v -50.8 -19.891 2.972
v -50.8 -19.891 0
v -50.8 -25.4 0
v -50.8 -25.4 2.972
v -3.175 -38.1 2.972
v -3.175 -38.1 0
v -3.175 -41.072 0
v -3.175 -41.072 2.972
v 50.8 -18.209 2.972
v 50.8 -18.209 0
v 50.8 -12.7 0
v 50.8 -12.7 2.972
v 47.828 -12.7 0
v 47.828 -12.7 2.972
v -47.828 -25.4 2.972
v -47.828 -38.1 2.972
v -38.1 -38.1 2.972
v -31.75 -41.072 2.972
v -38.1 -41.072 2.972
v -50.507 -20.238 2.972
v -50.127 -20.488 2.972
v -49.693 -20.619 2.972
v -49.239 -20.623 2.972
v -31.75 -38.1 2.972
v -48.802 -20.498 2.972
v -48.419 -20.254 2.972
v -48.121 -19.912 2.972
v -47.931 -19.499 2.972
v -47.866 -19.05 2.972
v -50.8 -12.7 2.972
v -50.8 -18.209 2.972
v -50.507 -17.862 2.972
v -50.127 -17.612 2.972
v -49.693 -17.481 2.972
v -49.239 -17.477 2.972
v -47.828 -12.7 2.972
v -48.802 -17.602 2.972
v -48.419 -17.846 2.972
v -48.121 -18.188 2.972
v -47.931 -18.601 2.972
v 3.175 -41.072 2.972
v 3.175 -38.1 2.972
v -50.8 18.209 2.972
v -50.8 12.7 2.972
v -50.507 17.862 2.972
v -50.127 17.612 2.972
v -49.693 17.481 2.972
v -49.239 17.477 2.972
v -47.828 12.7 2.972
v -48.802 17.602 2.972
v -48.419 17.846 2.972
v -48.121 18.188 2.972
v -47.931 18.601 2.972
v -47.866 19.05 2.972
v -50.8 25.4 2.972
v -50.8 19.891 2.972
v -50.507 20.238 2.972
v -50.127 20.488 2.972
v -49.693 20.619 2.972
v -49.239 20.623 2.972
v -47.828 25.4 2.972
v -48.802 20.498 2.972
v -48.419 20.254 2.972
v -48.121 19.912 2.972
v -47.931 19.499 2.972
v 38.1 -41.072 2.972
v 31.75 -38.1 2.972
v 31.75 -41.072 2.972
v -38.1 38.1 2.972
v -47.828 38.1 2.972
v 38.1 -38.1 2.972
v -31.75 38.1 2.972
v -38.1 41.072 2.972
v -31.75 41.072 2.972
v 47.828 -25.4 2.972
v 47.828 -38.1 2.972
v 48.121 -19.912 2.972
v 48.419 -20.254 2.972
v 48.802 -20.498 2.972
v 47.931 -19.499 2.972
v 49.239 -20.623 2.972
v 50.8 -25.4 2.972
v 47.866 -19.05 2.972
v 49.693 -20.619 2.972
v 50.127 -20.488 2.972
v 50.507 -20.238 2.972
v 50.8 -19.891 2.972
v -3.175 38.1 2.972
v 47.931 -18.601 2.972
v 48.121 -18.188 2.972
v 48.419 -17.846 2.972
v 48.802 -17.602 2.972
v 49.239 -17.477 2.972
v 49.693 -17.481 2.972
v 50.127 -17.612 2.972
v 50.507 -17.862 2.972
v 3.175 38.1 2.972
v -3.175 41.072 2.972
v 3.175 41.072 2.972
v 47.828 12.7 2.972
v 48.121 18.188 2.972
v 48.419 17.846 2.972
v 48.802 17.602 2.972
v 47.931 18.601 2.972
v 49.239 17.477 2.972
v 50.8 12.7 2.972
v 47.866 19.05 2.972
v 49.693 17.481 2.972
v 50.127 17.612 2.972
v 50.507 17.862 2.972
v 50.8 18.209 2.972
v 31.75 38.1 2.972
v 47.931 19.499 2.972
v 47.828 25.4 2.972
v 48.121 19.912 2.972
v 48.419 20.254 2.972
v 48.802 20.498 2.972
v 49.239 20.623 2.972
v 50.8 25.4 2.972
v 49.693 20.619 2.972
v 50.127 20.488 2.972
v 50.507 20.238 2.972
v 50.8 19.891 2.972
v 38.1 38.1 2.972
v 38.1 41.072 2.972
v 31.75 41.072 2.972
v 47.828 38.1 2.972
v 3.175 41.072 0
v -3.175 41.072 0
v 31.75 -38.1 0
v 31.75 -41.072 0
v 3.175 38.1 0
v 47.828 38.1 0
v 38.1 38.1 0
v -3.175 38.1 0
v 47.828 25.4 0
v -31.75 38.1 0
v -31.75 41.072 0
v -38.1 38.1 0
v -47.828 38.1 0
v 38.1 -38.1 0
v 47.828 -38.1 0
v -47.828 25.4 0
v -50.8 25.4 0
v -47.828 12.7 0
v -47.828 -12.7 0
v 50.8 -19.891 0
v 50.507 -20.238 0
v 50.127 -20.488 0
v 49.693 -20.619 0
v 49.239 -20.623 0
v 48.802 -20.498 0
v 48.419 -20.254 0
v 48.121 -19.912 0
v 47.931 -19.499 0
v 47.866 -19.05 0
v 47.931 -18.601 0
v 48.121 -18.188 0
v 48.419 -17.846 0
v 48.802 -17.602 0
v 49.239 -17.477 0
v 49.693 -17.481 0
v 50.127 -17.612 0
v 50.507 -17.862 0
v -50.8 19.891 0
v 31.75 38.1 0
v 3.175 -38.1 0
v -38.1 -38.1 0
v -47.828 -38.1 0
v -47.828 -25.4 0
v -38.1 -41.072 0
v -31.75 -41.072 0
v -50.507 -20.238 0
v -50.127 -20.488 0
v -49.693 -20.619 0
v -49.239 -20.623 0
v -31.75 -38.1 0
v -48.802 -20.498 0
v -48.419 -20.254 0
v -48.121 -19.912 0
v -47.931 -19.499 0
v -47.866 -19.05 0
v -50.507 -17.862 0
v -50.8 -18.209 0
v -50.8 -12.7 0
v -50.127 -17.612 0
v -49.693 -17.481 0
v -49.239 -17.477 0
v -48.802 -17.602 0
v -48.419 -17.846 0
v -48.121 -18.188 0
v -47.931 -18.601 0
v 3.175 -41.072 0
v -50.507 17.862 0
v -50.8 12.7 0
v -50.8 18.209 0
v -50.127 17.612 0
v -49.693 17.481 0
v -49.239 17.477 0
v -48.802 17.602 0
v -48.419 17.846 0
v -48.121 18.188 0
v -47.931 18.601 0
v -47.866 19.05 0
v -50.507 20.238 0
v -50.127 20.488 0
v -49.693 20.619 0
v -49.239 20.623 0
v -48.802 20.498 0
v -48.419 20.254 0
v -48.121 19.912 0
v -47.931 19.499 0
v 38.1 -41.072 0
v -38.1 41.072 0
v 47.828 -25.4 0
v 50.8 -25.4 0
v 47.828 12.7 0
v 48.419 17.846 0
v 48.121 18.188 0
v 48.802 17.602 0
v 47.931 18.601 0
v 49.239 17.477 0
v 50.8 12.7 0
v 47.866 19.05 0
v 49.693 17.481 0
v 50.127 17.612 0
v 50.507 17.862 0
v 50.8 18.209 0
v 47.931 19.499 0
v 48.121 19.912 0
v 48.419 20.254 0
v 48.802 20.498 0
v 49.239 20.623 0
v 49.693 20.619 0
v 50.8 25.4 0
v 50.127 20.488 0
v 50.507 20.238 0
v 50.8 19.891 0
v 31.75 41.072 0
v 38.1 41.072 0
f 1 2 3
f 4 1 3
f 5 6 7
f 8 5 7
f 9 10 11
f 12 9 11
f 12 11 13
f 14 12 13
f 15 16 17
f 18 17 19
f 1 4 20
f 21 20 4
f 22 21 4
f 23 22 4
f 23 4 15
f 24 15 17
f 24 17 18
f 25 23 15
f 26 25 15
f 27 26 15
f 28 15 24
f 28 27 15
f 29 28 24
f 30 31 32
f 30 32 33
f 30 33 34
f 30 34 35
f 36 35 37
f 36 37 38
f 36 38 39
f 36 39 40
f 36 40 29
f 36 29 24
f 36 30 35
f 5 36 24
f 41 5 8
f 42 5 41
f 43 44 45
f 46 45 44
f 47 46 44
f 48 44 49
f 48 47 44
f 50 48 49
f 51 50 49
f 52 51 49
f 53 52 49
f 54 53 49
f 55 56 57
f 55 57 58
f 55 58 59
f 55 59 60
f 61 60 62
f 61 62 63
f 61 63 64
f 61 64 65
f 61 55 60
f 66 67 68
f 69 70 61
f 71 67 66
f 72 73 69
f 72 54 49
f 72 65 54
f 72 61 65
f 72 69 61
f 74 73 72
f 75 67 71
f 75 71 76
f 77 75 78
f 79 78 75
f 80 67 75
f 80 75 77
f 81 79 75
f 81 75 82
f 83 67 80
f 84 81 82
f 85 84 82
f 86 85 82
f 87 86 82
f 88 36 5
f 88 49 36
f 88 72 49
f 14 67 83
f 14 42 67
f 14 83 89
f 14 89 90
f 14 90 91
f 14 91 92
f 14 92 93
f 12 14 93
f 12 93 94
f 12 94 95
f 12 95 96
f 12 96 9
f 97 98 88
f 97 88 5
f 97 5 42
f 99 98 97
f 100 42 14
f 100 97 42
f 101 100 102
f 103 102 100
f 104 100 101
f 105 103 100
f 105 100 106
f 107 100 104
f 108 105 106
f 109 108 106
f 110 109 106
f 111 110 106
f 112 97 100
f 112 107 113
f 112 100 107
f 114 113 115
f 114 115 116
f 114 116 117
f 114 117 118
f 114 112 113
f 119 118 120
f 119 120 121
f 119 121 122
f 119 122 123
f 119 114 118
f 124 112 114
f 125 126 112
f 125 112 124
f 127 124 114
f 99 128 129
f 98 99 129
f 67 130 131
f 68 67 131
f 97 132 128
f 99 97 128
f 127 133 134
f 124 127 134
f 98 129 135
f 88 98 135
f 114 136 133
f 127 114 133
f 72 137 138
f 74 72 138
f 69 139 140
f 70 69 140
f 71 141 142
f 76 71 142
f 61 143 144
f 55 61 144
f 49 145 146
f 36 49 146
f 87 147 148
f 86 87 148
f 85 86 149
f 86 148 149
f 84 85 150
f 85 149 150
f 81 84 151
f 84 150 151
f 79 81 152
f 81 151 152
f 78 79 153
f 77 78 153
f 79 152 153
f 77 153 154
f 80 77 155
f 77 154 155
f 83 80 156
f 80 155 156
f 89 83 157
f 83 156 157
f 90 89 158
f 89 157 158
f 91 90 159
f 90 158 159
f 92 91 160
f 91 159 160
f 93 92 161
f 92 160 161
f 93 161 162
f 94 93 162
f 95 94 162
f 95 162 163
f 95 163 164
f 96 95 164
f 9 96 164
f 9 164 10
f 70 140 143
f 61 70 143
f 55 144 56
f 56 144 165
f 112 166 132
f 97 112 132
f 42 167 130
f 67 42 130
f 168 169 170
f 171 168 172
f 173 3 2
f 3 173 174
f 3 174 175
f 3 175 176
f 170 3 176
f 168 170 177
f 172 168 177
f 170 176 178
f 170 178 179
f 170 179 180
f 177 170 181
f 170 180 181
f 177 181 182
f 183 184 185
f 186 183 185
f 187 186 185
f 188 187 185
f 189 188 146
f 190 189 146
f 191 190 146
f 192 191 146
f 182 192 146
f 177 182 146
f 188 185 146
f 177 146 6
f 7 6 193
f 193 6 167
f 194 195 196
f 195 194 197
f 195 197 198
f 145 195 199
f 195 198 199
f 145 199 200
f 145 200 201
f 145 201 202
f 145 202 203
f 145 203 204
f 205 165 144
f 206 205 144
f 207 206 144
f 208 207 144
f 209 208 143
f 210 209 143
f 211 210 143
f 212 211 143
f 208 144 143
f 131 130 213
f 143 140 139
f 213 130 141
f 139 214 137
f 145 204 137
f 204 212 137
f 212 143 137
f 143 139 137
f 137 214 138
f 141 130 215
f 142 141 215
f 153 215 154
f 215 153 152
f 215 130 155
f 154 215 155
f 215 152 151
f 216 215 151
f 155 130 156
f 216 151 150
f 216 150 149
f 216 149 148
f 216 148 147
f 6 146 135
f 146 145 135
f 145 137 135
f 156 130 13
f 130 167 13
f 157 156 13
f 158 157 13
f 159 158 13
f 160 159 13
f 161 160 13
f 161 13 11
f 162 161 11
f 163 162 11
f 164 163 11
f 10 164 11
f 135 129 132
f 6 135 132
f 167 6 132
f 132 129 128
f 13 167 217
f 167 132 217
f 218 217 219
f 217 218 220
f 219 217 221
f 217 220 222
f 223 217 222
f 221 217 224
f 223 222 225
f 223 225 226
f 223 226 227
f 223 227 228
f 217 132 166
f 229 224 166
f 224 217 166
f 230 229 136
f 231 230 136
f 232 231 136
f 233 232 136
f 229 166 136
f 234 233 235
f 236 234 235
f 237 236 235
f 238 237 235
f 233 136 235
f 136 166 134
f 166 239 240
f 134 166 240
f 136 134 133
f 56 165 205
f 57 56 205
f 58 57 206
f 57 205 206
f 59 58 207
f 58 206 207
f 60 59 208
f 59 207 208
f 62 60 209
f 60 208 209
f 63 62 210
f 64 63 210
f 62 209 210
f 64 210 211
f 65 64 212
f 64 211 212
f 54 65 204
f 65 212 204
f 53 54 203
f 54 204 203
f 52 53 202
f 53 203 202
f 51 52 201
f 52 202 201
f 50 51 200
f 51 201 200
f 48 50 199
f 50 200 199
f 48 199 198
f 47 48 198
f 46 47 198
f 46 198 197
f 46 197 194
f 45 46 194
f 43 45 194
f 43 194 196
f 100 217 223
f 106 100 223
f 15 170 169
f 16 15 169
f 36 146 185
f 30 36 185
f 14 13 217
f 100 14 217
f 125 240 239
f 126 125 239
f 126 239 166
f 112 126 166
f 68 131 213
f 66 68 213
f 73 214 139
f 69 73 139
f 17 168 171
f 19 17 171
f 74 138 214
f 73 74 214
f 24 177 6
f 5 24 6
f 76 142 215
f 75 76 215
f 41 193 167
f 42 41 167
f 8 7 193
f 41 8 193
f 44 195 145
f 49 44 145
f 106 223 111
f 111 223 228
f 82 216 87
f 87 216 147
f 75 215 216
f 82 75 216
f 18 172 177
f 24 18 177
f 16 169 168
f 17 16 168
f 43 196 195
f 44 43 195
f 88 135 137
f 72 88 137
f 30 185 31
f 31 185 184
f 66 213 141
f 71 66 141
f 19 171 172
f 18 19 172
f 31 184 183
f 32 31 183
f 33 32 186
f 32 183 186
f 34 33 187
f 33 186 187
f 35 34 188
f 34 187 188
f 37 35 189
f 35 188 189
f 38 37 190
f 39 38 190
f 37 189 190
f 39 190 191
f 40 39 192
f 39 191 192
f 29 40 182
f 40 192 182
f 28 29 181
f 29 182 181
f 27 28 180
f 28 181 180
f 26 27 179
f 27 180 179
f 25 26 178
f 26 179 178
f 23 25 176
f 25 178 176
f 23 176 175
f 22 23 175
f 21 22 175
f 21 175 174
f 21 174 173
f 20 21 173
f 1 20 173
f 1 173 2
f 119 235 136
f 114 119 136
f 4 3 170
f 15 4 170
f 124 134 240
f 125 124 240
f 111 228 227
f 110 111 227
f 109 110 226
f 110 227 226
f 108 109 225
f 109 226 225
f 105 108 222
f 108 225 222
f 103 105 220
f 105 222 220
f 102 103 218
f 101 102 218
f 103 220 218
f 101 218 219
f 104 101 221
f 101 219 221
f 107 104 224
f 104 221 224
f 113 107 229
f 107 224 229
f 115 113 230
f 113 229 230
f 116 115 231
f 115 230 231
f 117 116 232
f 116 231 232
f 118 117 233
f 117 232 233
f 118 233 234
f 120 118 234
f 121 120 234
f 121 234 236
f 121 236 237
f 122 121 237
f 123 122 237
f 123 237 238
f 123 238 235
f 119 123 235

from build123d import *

# Parameters (mm, degrees)
F1_DEPTH = 2.9718


with BuildPart() as f1:
    # F0 (on Top) → F1 (new body)
    with BuildSketch(Plane.XY):
        with BuildLine():
            Line((47.8282, 25.4), (47.8282, 38.1))
            Line((47.8282, 38.1), (38.1, 38.1))
            Line((38.1, 38.1), (38.1, 41.0718))
            Line((38.1, 41.0718), (31.75, 41.0718))
            Line((31.75, 41.0718), (31.75, 38.1))
            Line((31.75, 38.1), (3.175, 38.1))
            Line((3.175, 38.1), (3.175, 41.0718))
            Line((3.175, 41.0718), (-3.175, 41.0718))
            Line((-3.175, 41.0718), (-3.175, 38.1))
            Line((-3.175, 38.1), (-31.75, 38.1))
            Line((-31.75, 38.1), (-31.75, 41.0718))
            Line((-31.75, 41.0718), (-38.1, 41.0718))
            Line((-38.1, 41.0718), (-38.1, 38.1))
            Line((-38.1, 38.1), (-47.8282, 38.1))
            Line((-47.8282, 38.1), (-47.8282, 25.4))
            Line((-47.8282, 25.4), (-50.8, 25.4))
            Line((-50.8, 25.4), (-50.8, 19.891369))
            ThreePointArc((-50.8, 19.891369), (-47.8663, 19.05), (-50.8, 18.208631))
            Line((-50.8, 18.208631), (-50.8, 12.7))
            Line((-50.8, 12.7), (-47.8282, 12.7))
            Line((-47.8282, 12.7), (-47.8282, 0))
            Line((-47.8282, 0), (-47.8282, -12.7))
            Line((-47.8282, -12.7), (-50.8, -12.7))
            Line((-50.8, -12.7), (-50.8, -18.208631))
            ThreePointArc((-50.8, -18.208631), (-47.8663, -19.05), (-50.8, -19.891369))
            Line((-50.8, -19.891369), (-50.8, -25.4))
            Line((-50.8, -25.4), (-47.8282, -25.4))
            Line((-47.8282, -25.4), (-47.8282, -38.1))
            Line((-47.8282, -38.1), (-38.1, -38.1))
            Line((-38.1, -38.1), (-38.1, -41.0718))
            Line((-38.1, -41.0718), (-31.75, -41.0718))
            Line((-31.75, -41.0718), (-31.75, -38.1))
            Line((-31.75, -38.1), (-3.175, -38.1))
            Line((-3.175, -38.1), (-3.175, -41.0718))
            Line((-3.175, -41.0718), (3.175, -41.0718))
            Line((3.175, -41.0718), (3.175, -38.1))
            Line((3.175, -38.1), (31.75, -38.1))
            Line((31.75, -38.1), (31.75, -41.0718))
            Line((31.75, -41.0718), (38.1, -41.0718))
            Line((38.1, -41.0718), (38.1, -38.1))
            Line((38.1, -38.1), (47.8282, -38.1))
            Line((47.8282, -38.1), (47.8282, -25.4))
            Line((47.8282, -25.4), (50.8, -25.4))
            Line((50.8, -25.4), (50.8, -19.891369))
            ThreePointArc((50.8, -19.891369), (47.8663, -19.05), (50.8, -18.208631))
            Line((50.8, -18.208631), (50.8, -12.7))
            Line((50.8, -12.7), (47.8282, -12.7))
            Line((47.8282, -12.7), (47.8282, 0))
            Line((47.8282, 0), (47.8282, 12.7))
            Line((47.8282, 12.7), (50.8, 12.7))
            Line((50.8, 12.7), (50.8, 18.208631))
            ThreePointArc((50.8, 18.208631), (47.8663, 19.05), (50.8, 19.891369))
            Line((50.8, 19.891369), (50.8, 25.4))
            Line((50.8, 25.4), (47.8282, 25.4))
        make_face()
    extrude(amount=F1_DEPTH)


solid = f1.part
